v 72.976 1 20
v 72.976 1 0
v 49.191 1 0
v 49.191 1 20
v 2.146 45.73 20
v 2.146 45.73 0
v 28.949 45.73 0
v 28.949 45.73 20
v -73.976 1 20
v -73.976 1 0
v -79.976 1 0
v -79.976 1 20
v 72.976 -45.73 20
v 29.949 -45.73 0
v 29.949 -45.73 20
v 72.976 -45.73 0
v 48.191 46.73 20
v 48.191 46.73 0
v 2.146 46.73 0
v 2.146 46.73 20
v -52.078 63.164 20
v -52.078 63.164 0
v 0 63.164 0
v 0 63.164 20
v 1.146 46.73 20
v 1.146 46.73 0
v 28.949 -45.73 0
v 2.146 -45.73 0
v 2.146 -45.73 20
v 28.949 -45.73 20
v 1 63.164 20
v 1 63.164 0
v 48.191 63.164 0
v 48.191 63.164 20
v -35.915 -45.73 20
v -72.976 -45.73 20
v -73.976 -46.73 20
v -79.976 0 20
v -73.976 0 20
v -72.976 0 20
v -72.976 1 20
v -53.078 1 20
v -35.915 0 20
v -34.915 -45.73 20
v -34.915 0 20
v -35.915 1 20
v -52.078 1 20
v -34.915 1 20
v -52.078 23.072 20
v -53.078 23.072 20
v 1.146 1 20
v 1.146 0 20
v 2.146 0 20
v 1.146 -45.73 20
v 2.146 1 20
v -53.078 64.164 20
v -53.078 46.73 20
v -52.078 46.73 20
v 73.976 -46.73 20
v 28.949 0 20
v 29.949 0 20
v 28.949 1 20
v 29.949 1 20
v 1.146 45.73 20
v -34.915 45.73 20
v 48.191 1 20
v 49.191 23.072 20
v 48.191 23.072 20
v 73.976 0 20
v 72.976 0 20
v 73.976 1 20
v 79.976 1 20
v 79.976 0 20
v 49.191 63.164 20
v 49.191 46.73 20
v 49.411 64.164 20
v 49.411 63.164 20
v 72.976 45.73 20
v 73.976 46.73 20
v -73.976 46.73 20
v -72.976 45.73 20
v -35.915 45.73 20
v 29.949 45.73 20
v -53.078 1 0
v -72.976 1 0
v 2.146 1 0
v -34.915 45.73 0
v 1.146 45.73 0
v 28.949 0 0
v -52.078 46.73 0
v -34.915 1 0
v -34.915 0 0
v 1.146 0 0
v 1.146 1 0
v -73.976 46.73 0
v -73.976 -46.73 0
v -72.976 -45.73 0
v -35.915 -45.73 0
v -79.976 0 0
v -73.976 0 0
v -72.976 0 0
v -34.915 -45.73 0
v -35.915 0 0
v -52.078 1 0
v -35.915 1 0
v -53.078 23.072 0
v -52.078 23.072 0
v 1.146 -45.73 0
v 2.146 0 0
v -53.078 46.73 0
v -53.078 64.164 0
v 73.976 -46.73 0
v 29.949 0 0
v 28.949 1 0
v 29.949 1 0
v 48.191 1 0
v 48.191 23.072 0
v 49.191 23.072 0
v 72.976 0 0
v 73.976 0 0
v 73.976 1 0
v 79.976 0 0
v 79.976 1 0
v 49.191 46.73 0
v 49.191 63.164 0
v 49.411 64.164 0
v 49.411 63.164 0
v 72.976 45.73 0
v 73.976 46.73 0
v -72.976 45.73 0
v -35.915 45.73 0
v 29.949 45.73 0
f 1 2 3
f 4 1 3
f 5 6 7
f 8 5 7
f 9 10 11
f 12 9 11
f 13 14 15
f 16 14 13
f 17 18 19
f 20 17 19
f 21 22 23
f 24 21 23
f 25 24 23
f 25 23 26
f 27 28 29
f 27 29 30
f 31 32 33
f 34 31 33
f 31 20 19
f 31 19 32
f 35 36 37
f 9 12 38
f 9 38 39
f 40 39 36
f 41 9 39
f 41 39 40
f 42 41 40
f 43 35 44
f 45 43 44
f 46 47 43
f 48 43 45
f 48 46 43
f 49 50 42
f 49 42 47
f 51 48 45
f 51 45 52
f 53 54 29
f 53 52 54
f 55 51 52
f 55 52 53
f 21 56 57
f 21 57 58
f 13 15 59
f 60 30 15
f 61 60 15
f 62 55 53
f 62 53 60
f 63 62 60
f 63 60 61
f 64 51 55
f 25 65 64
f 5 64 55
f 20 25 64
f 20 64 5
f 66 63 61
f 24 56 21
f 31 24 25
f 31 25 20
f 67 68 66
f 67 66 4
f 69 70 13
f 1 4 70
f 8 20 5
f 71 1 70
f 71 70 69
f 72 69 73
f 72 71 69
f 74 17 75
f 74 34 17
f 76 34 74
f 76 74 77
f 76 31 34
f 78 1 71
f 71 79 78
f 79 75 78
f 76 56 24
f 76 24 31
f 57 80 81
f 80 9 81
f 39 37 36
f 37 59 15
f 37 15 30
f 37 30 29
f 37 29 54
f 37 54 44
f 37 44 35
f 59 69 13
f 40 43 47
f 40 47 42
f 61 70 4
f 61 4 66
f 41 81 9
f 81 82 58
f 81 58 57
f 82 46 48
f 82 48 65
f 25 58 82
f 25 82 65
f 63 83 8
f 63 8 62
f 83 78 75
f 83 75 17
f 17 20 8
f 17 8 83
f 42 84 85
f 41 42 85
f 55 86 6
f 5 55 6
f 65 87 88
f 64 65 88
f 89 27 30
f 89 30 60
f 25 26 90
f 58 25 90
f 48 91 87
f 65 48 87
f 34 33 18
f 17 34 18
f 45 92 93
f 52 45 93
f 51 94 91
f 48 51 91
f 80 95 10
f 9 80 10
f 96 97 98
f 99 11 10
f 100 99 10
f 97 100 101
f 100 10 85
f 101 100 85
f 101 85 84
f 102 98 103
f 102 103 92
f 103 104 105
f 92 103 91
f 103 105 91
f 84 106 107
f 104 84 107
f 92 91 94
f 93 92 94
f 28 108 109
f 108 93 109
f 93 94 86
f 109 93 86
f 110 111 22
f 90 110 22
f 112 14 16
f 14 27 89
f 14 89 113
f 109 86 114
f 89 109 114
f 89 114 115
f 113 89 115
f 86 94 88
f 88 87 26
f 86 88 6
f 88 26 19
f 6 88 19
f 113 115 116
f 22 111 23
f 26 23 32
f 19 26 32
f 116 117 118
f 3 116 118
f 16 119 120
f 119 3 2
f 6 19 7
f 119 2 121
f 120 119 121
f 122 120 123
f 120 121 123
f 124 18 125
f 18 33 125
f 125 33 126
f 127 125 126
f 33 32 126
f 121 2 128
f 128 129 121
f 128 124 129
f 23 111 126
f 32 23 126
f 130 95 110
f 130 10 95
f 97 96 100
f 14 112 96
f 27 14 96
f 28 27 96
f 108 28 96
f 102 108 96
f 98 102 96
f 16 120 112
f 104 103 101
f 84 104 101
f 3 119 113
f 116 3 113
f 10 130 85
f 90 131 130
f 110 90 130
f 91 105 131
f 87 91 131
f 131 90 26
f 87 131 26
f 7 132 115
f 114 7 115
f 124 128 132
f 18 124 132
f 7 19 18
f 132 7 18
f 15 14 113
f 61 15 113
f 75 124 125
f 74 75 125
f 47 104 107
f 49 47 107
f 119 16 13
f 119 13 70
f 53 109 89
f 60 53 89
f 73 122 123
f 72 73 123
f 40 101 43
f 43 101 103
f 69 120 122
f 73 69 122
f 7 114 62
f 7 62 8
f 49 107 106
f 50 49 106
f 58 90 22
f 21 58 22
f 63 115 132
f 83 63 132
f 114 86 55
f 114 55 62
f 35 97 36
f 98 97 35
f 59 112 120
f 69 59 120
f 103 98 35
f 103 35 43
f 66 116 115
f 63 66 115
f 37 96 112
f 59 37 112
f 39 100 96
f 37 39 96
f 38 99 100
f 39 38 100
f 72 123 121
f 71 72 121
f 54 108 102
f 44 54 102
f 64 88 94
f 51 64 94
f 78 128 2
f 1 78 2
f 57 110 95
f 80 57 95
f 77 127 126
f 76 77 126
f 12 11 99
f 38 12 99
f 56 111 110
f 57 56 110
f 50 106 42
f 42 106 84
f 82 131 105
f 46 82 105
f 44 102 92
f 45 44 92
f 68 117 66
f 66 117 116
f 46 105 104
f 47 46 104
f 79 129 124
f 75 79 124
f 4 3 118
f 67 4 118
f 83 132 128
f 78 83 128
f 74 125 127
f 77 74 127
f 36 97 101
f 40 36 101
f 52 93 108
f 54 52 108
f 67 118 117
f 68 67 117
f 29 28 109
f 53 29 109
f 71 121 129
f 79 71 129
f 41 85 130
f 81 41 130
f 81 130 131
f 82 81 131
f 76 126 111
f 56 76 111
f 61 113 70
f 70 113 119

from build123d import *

# Parameters (mm, degrees)
F0_W     = 37.0614326914
F0_H     = 45.7304640924
F0_W_2   = 26.8021334539
F0_W_3   = 43.0278818478
F0_H_2   = 44.7304640924
F1_DEPTH = 20


with BuildPart() as f1:
    # F0 (on Top) → F1 (new body)
    with BuildSketch(Plane.XY):
        Polygon((73.9764403422, 1), (73.9764403422, 46.7304640924), (49.1905527413, 46.7304640924), (49.1905527413, 63.1642210121), (49.4113042951, 63.1642210121), (49.4113042951, 64.1642210121), (-53.0780255795, 64.1642210121), (-53.0780255795, 63.1642210121), (-53.0780255795, 46.7304640924), (-73.9764403422, 46.7304640924), (-73.9764403422, 1), (-79.9764403422, 1), (-79.9764403422, 0), (-73.9764403422, 0), (-73.9764403422, -46.7304640924), (73.9764403422, -46.7304640924), (73.9764403422, 0), (79.9764403422, 0), (79.9764403422, 1), align=None)
        with Locations((-54.4457239965, -22.8652320462)):
            Rectangle(F0_W, F0_H, mode=Mode.SUBTRACT)
        Polygon((-34.9150076509, 45.7304640924), (1.1464250405, 45.7304640924), (1.1464250405, 1), (1.1464250405, 0), (1.1464250405, -45.7304640924), (-34.9150076509, -45.7304640924), (-34.9150076509, 0), (-34.9150076509, 1), align=None, mode=Mode.SUBTRACT)
        with Locations((15.5474917675, -22.8652320462)):
            Rectangle(F0_W_2, F0_H, mode=Mode.SUBTRACT)
        with Locations((51.4624994183, -22.8652320462)):
            Rectangle(F0_W_3, F0_H, mode=Mode.SUBTRACT)
        Polygon((-72.9764403422, 1), (-72.9764403422, 45.7304640924), (-35.9150076509, 45.7304640924), (-35.9150076509, 1), (-52.0780255795, 1), (-52.0780255795, 23.0720378458), (-53.0780255795, 23.0720378458), (-53.0780255795, 1), align=None, mode=Mode.SUBTRACT)
        Polygon((-52.0780255795, 63.1642210121), (0, 63.1642210121), (1.1464250405, 46.7304640924), (-52.0780255795, 46.7304640924), align=None, mode=Mode.SUBTRACT)
        with Locations((15.5474917675, 23.3652320462)):
            Rectangle(F0_W_2, F0_H_2, mode=Mode.SUBTRACT)
        Polygon((29.9485584944, 1), (29.9485584944, 45.7304640924), (72.9764403422, 45.7304640924), (72.9764403422, 1), (49.1905527413, 1), (49.1905527413, 23.0720378458), (48.1905527413, 23.0720378458), (48.1905527413, 1), align=None, mode=Mode.SUBTRACT)
        Polygon((1, 63.1642210121), (48.1905527413, 63.1642210121), (48.1905527413, 46.7304640924), (2.1464250405, 46.7304640924), align=None, mode=Mode.SUBTRACT)
        Polygon((1.1464250405, 0), (1.1464250405, 1), (-34.9150076509, 1), (-34.9150076509, 0), (0, 0), align=None)
    extrude(amount=F1_DEPTH)


solid = f1.part
